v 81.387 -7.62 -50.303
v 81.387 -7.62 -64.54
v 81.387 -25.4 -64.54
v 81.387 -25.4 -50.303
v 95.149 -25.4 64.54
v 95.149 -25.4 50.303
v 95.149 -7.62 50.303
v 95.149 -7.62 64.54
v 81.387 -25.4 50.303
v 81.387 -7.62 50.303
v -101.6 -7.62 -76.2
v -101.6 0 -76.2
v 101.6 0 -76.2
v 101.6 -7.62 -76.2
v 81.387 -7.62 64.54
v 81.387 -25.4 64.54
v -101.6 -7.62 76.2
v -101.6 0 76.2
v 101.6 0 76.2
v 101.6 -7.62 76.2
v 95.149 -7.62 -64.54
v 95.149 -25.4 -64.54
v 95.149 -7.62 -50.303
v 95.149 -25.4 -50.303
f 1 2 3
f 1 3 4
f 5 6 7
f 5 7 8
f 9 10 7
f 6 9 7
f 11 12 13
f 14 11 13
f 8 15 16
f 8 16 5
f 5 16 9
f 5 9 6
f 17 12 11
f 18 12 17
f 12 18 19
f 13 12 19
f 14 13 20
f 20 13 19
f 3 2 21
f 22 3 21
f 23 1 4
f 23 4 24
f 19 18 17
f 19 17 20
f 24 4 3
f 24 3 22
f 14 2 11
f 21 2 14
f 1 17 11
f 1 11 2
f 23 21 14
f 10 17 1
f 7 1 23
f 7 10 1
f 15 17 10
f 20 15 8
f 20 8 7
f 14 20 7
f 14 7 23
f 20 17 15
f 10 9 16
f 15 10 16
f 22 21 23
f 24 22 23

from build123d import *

# Parameters (mm, degrees)
F0_W     = 203.2
F0_H     = 152.4
F1_DEPTH = 7.62
F2_W     = 13.762258
F2_H     = 14.236811
F3_DEPTH = 17.78


with BuildPart() as f1:
    # F0 (on Front) → F1 (new body)
    with BuildSketch(Plane.XZ):
        Rectangle(F0_W, F0_H)
    extrude(amount=F1_DEPTH)

    # F2 (on face) → F3 (join)
    with BuildSketch(Plane.XZ.offset(7.62)):
        with Locations((88.268232, 57.421802)):
            Rectangle(F2_W, F2_H)
        with Locations((88.268232, -57.421802)):
            Rectangle(F2_W, F2_H)
    extrude(amount=F3_DEPTH)


solid = f1.part
